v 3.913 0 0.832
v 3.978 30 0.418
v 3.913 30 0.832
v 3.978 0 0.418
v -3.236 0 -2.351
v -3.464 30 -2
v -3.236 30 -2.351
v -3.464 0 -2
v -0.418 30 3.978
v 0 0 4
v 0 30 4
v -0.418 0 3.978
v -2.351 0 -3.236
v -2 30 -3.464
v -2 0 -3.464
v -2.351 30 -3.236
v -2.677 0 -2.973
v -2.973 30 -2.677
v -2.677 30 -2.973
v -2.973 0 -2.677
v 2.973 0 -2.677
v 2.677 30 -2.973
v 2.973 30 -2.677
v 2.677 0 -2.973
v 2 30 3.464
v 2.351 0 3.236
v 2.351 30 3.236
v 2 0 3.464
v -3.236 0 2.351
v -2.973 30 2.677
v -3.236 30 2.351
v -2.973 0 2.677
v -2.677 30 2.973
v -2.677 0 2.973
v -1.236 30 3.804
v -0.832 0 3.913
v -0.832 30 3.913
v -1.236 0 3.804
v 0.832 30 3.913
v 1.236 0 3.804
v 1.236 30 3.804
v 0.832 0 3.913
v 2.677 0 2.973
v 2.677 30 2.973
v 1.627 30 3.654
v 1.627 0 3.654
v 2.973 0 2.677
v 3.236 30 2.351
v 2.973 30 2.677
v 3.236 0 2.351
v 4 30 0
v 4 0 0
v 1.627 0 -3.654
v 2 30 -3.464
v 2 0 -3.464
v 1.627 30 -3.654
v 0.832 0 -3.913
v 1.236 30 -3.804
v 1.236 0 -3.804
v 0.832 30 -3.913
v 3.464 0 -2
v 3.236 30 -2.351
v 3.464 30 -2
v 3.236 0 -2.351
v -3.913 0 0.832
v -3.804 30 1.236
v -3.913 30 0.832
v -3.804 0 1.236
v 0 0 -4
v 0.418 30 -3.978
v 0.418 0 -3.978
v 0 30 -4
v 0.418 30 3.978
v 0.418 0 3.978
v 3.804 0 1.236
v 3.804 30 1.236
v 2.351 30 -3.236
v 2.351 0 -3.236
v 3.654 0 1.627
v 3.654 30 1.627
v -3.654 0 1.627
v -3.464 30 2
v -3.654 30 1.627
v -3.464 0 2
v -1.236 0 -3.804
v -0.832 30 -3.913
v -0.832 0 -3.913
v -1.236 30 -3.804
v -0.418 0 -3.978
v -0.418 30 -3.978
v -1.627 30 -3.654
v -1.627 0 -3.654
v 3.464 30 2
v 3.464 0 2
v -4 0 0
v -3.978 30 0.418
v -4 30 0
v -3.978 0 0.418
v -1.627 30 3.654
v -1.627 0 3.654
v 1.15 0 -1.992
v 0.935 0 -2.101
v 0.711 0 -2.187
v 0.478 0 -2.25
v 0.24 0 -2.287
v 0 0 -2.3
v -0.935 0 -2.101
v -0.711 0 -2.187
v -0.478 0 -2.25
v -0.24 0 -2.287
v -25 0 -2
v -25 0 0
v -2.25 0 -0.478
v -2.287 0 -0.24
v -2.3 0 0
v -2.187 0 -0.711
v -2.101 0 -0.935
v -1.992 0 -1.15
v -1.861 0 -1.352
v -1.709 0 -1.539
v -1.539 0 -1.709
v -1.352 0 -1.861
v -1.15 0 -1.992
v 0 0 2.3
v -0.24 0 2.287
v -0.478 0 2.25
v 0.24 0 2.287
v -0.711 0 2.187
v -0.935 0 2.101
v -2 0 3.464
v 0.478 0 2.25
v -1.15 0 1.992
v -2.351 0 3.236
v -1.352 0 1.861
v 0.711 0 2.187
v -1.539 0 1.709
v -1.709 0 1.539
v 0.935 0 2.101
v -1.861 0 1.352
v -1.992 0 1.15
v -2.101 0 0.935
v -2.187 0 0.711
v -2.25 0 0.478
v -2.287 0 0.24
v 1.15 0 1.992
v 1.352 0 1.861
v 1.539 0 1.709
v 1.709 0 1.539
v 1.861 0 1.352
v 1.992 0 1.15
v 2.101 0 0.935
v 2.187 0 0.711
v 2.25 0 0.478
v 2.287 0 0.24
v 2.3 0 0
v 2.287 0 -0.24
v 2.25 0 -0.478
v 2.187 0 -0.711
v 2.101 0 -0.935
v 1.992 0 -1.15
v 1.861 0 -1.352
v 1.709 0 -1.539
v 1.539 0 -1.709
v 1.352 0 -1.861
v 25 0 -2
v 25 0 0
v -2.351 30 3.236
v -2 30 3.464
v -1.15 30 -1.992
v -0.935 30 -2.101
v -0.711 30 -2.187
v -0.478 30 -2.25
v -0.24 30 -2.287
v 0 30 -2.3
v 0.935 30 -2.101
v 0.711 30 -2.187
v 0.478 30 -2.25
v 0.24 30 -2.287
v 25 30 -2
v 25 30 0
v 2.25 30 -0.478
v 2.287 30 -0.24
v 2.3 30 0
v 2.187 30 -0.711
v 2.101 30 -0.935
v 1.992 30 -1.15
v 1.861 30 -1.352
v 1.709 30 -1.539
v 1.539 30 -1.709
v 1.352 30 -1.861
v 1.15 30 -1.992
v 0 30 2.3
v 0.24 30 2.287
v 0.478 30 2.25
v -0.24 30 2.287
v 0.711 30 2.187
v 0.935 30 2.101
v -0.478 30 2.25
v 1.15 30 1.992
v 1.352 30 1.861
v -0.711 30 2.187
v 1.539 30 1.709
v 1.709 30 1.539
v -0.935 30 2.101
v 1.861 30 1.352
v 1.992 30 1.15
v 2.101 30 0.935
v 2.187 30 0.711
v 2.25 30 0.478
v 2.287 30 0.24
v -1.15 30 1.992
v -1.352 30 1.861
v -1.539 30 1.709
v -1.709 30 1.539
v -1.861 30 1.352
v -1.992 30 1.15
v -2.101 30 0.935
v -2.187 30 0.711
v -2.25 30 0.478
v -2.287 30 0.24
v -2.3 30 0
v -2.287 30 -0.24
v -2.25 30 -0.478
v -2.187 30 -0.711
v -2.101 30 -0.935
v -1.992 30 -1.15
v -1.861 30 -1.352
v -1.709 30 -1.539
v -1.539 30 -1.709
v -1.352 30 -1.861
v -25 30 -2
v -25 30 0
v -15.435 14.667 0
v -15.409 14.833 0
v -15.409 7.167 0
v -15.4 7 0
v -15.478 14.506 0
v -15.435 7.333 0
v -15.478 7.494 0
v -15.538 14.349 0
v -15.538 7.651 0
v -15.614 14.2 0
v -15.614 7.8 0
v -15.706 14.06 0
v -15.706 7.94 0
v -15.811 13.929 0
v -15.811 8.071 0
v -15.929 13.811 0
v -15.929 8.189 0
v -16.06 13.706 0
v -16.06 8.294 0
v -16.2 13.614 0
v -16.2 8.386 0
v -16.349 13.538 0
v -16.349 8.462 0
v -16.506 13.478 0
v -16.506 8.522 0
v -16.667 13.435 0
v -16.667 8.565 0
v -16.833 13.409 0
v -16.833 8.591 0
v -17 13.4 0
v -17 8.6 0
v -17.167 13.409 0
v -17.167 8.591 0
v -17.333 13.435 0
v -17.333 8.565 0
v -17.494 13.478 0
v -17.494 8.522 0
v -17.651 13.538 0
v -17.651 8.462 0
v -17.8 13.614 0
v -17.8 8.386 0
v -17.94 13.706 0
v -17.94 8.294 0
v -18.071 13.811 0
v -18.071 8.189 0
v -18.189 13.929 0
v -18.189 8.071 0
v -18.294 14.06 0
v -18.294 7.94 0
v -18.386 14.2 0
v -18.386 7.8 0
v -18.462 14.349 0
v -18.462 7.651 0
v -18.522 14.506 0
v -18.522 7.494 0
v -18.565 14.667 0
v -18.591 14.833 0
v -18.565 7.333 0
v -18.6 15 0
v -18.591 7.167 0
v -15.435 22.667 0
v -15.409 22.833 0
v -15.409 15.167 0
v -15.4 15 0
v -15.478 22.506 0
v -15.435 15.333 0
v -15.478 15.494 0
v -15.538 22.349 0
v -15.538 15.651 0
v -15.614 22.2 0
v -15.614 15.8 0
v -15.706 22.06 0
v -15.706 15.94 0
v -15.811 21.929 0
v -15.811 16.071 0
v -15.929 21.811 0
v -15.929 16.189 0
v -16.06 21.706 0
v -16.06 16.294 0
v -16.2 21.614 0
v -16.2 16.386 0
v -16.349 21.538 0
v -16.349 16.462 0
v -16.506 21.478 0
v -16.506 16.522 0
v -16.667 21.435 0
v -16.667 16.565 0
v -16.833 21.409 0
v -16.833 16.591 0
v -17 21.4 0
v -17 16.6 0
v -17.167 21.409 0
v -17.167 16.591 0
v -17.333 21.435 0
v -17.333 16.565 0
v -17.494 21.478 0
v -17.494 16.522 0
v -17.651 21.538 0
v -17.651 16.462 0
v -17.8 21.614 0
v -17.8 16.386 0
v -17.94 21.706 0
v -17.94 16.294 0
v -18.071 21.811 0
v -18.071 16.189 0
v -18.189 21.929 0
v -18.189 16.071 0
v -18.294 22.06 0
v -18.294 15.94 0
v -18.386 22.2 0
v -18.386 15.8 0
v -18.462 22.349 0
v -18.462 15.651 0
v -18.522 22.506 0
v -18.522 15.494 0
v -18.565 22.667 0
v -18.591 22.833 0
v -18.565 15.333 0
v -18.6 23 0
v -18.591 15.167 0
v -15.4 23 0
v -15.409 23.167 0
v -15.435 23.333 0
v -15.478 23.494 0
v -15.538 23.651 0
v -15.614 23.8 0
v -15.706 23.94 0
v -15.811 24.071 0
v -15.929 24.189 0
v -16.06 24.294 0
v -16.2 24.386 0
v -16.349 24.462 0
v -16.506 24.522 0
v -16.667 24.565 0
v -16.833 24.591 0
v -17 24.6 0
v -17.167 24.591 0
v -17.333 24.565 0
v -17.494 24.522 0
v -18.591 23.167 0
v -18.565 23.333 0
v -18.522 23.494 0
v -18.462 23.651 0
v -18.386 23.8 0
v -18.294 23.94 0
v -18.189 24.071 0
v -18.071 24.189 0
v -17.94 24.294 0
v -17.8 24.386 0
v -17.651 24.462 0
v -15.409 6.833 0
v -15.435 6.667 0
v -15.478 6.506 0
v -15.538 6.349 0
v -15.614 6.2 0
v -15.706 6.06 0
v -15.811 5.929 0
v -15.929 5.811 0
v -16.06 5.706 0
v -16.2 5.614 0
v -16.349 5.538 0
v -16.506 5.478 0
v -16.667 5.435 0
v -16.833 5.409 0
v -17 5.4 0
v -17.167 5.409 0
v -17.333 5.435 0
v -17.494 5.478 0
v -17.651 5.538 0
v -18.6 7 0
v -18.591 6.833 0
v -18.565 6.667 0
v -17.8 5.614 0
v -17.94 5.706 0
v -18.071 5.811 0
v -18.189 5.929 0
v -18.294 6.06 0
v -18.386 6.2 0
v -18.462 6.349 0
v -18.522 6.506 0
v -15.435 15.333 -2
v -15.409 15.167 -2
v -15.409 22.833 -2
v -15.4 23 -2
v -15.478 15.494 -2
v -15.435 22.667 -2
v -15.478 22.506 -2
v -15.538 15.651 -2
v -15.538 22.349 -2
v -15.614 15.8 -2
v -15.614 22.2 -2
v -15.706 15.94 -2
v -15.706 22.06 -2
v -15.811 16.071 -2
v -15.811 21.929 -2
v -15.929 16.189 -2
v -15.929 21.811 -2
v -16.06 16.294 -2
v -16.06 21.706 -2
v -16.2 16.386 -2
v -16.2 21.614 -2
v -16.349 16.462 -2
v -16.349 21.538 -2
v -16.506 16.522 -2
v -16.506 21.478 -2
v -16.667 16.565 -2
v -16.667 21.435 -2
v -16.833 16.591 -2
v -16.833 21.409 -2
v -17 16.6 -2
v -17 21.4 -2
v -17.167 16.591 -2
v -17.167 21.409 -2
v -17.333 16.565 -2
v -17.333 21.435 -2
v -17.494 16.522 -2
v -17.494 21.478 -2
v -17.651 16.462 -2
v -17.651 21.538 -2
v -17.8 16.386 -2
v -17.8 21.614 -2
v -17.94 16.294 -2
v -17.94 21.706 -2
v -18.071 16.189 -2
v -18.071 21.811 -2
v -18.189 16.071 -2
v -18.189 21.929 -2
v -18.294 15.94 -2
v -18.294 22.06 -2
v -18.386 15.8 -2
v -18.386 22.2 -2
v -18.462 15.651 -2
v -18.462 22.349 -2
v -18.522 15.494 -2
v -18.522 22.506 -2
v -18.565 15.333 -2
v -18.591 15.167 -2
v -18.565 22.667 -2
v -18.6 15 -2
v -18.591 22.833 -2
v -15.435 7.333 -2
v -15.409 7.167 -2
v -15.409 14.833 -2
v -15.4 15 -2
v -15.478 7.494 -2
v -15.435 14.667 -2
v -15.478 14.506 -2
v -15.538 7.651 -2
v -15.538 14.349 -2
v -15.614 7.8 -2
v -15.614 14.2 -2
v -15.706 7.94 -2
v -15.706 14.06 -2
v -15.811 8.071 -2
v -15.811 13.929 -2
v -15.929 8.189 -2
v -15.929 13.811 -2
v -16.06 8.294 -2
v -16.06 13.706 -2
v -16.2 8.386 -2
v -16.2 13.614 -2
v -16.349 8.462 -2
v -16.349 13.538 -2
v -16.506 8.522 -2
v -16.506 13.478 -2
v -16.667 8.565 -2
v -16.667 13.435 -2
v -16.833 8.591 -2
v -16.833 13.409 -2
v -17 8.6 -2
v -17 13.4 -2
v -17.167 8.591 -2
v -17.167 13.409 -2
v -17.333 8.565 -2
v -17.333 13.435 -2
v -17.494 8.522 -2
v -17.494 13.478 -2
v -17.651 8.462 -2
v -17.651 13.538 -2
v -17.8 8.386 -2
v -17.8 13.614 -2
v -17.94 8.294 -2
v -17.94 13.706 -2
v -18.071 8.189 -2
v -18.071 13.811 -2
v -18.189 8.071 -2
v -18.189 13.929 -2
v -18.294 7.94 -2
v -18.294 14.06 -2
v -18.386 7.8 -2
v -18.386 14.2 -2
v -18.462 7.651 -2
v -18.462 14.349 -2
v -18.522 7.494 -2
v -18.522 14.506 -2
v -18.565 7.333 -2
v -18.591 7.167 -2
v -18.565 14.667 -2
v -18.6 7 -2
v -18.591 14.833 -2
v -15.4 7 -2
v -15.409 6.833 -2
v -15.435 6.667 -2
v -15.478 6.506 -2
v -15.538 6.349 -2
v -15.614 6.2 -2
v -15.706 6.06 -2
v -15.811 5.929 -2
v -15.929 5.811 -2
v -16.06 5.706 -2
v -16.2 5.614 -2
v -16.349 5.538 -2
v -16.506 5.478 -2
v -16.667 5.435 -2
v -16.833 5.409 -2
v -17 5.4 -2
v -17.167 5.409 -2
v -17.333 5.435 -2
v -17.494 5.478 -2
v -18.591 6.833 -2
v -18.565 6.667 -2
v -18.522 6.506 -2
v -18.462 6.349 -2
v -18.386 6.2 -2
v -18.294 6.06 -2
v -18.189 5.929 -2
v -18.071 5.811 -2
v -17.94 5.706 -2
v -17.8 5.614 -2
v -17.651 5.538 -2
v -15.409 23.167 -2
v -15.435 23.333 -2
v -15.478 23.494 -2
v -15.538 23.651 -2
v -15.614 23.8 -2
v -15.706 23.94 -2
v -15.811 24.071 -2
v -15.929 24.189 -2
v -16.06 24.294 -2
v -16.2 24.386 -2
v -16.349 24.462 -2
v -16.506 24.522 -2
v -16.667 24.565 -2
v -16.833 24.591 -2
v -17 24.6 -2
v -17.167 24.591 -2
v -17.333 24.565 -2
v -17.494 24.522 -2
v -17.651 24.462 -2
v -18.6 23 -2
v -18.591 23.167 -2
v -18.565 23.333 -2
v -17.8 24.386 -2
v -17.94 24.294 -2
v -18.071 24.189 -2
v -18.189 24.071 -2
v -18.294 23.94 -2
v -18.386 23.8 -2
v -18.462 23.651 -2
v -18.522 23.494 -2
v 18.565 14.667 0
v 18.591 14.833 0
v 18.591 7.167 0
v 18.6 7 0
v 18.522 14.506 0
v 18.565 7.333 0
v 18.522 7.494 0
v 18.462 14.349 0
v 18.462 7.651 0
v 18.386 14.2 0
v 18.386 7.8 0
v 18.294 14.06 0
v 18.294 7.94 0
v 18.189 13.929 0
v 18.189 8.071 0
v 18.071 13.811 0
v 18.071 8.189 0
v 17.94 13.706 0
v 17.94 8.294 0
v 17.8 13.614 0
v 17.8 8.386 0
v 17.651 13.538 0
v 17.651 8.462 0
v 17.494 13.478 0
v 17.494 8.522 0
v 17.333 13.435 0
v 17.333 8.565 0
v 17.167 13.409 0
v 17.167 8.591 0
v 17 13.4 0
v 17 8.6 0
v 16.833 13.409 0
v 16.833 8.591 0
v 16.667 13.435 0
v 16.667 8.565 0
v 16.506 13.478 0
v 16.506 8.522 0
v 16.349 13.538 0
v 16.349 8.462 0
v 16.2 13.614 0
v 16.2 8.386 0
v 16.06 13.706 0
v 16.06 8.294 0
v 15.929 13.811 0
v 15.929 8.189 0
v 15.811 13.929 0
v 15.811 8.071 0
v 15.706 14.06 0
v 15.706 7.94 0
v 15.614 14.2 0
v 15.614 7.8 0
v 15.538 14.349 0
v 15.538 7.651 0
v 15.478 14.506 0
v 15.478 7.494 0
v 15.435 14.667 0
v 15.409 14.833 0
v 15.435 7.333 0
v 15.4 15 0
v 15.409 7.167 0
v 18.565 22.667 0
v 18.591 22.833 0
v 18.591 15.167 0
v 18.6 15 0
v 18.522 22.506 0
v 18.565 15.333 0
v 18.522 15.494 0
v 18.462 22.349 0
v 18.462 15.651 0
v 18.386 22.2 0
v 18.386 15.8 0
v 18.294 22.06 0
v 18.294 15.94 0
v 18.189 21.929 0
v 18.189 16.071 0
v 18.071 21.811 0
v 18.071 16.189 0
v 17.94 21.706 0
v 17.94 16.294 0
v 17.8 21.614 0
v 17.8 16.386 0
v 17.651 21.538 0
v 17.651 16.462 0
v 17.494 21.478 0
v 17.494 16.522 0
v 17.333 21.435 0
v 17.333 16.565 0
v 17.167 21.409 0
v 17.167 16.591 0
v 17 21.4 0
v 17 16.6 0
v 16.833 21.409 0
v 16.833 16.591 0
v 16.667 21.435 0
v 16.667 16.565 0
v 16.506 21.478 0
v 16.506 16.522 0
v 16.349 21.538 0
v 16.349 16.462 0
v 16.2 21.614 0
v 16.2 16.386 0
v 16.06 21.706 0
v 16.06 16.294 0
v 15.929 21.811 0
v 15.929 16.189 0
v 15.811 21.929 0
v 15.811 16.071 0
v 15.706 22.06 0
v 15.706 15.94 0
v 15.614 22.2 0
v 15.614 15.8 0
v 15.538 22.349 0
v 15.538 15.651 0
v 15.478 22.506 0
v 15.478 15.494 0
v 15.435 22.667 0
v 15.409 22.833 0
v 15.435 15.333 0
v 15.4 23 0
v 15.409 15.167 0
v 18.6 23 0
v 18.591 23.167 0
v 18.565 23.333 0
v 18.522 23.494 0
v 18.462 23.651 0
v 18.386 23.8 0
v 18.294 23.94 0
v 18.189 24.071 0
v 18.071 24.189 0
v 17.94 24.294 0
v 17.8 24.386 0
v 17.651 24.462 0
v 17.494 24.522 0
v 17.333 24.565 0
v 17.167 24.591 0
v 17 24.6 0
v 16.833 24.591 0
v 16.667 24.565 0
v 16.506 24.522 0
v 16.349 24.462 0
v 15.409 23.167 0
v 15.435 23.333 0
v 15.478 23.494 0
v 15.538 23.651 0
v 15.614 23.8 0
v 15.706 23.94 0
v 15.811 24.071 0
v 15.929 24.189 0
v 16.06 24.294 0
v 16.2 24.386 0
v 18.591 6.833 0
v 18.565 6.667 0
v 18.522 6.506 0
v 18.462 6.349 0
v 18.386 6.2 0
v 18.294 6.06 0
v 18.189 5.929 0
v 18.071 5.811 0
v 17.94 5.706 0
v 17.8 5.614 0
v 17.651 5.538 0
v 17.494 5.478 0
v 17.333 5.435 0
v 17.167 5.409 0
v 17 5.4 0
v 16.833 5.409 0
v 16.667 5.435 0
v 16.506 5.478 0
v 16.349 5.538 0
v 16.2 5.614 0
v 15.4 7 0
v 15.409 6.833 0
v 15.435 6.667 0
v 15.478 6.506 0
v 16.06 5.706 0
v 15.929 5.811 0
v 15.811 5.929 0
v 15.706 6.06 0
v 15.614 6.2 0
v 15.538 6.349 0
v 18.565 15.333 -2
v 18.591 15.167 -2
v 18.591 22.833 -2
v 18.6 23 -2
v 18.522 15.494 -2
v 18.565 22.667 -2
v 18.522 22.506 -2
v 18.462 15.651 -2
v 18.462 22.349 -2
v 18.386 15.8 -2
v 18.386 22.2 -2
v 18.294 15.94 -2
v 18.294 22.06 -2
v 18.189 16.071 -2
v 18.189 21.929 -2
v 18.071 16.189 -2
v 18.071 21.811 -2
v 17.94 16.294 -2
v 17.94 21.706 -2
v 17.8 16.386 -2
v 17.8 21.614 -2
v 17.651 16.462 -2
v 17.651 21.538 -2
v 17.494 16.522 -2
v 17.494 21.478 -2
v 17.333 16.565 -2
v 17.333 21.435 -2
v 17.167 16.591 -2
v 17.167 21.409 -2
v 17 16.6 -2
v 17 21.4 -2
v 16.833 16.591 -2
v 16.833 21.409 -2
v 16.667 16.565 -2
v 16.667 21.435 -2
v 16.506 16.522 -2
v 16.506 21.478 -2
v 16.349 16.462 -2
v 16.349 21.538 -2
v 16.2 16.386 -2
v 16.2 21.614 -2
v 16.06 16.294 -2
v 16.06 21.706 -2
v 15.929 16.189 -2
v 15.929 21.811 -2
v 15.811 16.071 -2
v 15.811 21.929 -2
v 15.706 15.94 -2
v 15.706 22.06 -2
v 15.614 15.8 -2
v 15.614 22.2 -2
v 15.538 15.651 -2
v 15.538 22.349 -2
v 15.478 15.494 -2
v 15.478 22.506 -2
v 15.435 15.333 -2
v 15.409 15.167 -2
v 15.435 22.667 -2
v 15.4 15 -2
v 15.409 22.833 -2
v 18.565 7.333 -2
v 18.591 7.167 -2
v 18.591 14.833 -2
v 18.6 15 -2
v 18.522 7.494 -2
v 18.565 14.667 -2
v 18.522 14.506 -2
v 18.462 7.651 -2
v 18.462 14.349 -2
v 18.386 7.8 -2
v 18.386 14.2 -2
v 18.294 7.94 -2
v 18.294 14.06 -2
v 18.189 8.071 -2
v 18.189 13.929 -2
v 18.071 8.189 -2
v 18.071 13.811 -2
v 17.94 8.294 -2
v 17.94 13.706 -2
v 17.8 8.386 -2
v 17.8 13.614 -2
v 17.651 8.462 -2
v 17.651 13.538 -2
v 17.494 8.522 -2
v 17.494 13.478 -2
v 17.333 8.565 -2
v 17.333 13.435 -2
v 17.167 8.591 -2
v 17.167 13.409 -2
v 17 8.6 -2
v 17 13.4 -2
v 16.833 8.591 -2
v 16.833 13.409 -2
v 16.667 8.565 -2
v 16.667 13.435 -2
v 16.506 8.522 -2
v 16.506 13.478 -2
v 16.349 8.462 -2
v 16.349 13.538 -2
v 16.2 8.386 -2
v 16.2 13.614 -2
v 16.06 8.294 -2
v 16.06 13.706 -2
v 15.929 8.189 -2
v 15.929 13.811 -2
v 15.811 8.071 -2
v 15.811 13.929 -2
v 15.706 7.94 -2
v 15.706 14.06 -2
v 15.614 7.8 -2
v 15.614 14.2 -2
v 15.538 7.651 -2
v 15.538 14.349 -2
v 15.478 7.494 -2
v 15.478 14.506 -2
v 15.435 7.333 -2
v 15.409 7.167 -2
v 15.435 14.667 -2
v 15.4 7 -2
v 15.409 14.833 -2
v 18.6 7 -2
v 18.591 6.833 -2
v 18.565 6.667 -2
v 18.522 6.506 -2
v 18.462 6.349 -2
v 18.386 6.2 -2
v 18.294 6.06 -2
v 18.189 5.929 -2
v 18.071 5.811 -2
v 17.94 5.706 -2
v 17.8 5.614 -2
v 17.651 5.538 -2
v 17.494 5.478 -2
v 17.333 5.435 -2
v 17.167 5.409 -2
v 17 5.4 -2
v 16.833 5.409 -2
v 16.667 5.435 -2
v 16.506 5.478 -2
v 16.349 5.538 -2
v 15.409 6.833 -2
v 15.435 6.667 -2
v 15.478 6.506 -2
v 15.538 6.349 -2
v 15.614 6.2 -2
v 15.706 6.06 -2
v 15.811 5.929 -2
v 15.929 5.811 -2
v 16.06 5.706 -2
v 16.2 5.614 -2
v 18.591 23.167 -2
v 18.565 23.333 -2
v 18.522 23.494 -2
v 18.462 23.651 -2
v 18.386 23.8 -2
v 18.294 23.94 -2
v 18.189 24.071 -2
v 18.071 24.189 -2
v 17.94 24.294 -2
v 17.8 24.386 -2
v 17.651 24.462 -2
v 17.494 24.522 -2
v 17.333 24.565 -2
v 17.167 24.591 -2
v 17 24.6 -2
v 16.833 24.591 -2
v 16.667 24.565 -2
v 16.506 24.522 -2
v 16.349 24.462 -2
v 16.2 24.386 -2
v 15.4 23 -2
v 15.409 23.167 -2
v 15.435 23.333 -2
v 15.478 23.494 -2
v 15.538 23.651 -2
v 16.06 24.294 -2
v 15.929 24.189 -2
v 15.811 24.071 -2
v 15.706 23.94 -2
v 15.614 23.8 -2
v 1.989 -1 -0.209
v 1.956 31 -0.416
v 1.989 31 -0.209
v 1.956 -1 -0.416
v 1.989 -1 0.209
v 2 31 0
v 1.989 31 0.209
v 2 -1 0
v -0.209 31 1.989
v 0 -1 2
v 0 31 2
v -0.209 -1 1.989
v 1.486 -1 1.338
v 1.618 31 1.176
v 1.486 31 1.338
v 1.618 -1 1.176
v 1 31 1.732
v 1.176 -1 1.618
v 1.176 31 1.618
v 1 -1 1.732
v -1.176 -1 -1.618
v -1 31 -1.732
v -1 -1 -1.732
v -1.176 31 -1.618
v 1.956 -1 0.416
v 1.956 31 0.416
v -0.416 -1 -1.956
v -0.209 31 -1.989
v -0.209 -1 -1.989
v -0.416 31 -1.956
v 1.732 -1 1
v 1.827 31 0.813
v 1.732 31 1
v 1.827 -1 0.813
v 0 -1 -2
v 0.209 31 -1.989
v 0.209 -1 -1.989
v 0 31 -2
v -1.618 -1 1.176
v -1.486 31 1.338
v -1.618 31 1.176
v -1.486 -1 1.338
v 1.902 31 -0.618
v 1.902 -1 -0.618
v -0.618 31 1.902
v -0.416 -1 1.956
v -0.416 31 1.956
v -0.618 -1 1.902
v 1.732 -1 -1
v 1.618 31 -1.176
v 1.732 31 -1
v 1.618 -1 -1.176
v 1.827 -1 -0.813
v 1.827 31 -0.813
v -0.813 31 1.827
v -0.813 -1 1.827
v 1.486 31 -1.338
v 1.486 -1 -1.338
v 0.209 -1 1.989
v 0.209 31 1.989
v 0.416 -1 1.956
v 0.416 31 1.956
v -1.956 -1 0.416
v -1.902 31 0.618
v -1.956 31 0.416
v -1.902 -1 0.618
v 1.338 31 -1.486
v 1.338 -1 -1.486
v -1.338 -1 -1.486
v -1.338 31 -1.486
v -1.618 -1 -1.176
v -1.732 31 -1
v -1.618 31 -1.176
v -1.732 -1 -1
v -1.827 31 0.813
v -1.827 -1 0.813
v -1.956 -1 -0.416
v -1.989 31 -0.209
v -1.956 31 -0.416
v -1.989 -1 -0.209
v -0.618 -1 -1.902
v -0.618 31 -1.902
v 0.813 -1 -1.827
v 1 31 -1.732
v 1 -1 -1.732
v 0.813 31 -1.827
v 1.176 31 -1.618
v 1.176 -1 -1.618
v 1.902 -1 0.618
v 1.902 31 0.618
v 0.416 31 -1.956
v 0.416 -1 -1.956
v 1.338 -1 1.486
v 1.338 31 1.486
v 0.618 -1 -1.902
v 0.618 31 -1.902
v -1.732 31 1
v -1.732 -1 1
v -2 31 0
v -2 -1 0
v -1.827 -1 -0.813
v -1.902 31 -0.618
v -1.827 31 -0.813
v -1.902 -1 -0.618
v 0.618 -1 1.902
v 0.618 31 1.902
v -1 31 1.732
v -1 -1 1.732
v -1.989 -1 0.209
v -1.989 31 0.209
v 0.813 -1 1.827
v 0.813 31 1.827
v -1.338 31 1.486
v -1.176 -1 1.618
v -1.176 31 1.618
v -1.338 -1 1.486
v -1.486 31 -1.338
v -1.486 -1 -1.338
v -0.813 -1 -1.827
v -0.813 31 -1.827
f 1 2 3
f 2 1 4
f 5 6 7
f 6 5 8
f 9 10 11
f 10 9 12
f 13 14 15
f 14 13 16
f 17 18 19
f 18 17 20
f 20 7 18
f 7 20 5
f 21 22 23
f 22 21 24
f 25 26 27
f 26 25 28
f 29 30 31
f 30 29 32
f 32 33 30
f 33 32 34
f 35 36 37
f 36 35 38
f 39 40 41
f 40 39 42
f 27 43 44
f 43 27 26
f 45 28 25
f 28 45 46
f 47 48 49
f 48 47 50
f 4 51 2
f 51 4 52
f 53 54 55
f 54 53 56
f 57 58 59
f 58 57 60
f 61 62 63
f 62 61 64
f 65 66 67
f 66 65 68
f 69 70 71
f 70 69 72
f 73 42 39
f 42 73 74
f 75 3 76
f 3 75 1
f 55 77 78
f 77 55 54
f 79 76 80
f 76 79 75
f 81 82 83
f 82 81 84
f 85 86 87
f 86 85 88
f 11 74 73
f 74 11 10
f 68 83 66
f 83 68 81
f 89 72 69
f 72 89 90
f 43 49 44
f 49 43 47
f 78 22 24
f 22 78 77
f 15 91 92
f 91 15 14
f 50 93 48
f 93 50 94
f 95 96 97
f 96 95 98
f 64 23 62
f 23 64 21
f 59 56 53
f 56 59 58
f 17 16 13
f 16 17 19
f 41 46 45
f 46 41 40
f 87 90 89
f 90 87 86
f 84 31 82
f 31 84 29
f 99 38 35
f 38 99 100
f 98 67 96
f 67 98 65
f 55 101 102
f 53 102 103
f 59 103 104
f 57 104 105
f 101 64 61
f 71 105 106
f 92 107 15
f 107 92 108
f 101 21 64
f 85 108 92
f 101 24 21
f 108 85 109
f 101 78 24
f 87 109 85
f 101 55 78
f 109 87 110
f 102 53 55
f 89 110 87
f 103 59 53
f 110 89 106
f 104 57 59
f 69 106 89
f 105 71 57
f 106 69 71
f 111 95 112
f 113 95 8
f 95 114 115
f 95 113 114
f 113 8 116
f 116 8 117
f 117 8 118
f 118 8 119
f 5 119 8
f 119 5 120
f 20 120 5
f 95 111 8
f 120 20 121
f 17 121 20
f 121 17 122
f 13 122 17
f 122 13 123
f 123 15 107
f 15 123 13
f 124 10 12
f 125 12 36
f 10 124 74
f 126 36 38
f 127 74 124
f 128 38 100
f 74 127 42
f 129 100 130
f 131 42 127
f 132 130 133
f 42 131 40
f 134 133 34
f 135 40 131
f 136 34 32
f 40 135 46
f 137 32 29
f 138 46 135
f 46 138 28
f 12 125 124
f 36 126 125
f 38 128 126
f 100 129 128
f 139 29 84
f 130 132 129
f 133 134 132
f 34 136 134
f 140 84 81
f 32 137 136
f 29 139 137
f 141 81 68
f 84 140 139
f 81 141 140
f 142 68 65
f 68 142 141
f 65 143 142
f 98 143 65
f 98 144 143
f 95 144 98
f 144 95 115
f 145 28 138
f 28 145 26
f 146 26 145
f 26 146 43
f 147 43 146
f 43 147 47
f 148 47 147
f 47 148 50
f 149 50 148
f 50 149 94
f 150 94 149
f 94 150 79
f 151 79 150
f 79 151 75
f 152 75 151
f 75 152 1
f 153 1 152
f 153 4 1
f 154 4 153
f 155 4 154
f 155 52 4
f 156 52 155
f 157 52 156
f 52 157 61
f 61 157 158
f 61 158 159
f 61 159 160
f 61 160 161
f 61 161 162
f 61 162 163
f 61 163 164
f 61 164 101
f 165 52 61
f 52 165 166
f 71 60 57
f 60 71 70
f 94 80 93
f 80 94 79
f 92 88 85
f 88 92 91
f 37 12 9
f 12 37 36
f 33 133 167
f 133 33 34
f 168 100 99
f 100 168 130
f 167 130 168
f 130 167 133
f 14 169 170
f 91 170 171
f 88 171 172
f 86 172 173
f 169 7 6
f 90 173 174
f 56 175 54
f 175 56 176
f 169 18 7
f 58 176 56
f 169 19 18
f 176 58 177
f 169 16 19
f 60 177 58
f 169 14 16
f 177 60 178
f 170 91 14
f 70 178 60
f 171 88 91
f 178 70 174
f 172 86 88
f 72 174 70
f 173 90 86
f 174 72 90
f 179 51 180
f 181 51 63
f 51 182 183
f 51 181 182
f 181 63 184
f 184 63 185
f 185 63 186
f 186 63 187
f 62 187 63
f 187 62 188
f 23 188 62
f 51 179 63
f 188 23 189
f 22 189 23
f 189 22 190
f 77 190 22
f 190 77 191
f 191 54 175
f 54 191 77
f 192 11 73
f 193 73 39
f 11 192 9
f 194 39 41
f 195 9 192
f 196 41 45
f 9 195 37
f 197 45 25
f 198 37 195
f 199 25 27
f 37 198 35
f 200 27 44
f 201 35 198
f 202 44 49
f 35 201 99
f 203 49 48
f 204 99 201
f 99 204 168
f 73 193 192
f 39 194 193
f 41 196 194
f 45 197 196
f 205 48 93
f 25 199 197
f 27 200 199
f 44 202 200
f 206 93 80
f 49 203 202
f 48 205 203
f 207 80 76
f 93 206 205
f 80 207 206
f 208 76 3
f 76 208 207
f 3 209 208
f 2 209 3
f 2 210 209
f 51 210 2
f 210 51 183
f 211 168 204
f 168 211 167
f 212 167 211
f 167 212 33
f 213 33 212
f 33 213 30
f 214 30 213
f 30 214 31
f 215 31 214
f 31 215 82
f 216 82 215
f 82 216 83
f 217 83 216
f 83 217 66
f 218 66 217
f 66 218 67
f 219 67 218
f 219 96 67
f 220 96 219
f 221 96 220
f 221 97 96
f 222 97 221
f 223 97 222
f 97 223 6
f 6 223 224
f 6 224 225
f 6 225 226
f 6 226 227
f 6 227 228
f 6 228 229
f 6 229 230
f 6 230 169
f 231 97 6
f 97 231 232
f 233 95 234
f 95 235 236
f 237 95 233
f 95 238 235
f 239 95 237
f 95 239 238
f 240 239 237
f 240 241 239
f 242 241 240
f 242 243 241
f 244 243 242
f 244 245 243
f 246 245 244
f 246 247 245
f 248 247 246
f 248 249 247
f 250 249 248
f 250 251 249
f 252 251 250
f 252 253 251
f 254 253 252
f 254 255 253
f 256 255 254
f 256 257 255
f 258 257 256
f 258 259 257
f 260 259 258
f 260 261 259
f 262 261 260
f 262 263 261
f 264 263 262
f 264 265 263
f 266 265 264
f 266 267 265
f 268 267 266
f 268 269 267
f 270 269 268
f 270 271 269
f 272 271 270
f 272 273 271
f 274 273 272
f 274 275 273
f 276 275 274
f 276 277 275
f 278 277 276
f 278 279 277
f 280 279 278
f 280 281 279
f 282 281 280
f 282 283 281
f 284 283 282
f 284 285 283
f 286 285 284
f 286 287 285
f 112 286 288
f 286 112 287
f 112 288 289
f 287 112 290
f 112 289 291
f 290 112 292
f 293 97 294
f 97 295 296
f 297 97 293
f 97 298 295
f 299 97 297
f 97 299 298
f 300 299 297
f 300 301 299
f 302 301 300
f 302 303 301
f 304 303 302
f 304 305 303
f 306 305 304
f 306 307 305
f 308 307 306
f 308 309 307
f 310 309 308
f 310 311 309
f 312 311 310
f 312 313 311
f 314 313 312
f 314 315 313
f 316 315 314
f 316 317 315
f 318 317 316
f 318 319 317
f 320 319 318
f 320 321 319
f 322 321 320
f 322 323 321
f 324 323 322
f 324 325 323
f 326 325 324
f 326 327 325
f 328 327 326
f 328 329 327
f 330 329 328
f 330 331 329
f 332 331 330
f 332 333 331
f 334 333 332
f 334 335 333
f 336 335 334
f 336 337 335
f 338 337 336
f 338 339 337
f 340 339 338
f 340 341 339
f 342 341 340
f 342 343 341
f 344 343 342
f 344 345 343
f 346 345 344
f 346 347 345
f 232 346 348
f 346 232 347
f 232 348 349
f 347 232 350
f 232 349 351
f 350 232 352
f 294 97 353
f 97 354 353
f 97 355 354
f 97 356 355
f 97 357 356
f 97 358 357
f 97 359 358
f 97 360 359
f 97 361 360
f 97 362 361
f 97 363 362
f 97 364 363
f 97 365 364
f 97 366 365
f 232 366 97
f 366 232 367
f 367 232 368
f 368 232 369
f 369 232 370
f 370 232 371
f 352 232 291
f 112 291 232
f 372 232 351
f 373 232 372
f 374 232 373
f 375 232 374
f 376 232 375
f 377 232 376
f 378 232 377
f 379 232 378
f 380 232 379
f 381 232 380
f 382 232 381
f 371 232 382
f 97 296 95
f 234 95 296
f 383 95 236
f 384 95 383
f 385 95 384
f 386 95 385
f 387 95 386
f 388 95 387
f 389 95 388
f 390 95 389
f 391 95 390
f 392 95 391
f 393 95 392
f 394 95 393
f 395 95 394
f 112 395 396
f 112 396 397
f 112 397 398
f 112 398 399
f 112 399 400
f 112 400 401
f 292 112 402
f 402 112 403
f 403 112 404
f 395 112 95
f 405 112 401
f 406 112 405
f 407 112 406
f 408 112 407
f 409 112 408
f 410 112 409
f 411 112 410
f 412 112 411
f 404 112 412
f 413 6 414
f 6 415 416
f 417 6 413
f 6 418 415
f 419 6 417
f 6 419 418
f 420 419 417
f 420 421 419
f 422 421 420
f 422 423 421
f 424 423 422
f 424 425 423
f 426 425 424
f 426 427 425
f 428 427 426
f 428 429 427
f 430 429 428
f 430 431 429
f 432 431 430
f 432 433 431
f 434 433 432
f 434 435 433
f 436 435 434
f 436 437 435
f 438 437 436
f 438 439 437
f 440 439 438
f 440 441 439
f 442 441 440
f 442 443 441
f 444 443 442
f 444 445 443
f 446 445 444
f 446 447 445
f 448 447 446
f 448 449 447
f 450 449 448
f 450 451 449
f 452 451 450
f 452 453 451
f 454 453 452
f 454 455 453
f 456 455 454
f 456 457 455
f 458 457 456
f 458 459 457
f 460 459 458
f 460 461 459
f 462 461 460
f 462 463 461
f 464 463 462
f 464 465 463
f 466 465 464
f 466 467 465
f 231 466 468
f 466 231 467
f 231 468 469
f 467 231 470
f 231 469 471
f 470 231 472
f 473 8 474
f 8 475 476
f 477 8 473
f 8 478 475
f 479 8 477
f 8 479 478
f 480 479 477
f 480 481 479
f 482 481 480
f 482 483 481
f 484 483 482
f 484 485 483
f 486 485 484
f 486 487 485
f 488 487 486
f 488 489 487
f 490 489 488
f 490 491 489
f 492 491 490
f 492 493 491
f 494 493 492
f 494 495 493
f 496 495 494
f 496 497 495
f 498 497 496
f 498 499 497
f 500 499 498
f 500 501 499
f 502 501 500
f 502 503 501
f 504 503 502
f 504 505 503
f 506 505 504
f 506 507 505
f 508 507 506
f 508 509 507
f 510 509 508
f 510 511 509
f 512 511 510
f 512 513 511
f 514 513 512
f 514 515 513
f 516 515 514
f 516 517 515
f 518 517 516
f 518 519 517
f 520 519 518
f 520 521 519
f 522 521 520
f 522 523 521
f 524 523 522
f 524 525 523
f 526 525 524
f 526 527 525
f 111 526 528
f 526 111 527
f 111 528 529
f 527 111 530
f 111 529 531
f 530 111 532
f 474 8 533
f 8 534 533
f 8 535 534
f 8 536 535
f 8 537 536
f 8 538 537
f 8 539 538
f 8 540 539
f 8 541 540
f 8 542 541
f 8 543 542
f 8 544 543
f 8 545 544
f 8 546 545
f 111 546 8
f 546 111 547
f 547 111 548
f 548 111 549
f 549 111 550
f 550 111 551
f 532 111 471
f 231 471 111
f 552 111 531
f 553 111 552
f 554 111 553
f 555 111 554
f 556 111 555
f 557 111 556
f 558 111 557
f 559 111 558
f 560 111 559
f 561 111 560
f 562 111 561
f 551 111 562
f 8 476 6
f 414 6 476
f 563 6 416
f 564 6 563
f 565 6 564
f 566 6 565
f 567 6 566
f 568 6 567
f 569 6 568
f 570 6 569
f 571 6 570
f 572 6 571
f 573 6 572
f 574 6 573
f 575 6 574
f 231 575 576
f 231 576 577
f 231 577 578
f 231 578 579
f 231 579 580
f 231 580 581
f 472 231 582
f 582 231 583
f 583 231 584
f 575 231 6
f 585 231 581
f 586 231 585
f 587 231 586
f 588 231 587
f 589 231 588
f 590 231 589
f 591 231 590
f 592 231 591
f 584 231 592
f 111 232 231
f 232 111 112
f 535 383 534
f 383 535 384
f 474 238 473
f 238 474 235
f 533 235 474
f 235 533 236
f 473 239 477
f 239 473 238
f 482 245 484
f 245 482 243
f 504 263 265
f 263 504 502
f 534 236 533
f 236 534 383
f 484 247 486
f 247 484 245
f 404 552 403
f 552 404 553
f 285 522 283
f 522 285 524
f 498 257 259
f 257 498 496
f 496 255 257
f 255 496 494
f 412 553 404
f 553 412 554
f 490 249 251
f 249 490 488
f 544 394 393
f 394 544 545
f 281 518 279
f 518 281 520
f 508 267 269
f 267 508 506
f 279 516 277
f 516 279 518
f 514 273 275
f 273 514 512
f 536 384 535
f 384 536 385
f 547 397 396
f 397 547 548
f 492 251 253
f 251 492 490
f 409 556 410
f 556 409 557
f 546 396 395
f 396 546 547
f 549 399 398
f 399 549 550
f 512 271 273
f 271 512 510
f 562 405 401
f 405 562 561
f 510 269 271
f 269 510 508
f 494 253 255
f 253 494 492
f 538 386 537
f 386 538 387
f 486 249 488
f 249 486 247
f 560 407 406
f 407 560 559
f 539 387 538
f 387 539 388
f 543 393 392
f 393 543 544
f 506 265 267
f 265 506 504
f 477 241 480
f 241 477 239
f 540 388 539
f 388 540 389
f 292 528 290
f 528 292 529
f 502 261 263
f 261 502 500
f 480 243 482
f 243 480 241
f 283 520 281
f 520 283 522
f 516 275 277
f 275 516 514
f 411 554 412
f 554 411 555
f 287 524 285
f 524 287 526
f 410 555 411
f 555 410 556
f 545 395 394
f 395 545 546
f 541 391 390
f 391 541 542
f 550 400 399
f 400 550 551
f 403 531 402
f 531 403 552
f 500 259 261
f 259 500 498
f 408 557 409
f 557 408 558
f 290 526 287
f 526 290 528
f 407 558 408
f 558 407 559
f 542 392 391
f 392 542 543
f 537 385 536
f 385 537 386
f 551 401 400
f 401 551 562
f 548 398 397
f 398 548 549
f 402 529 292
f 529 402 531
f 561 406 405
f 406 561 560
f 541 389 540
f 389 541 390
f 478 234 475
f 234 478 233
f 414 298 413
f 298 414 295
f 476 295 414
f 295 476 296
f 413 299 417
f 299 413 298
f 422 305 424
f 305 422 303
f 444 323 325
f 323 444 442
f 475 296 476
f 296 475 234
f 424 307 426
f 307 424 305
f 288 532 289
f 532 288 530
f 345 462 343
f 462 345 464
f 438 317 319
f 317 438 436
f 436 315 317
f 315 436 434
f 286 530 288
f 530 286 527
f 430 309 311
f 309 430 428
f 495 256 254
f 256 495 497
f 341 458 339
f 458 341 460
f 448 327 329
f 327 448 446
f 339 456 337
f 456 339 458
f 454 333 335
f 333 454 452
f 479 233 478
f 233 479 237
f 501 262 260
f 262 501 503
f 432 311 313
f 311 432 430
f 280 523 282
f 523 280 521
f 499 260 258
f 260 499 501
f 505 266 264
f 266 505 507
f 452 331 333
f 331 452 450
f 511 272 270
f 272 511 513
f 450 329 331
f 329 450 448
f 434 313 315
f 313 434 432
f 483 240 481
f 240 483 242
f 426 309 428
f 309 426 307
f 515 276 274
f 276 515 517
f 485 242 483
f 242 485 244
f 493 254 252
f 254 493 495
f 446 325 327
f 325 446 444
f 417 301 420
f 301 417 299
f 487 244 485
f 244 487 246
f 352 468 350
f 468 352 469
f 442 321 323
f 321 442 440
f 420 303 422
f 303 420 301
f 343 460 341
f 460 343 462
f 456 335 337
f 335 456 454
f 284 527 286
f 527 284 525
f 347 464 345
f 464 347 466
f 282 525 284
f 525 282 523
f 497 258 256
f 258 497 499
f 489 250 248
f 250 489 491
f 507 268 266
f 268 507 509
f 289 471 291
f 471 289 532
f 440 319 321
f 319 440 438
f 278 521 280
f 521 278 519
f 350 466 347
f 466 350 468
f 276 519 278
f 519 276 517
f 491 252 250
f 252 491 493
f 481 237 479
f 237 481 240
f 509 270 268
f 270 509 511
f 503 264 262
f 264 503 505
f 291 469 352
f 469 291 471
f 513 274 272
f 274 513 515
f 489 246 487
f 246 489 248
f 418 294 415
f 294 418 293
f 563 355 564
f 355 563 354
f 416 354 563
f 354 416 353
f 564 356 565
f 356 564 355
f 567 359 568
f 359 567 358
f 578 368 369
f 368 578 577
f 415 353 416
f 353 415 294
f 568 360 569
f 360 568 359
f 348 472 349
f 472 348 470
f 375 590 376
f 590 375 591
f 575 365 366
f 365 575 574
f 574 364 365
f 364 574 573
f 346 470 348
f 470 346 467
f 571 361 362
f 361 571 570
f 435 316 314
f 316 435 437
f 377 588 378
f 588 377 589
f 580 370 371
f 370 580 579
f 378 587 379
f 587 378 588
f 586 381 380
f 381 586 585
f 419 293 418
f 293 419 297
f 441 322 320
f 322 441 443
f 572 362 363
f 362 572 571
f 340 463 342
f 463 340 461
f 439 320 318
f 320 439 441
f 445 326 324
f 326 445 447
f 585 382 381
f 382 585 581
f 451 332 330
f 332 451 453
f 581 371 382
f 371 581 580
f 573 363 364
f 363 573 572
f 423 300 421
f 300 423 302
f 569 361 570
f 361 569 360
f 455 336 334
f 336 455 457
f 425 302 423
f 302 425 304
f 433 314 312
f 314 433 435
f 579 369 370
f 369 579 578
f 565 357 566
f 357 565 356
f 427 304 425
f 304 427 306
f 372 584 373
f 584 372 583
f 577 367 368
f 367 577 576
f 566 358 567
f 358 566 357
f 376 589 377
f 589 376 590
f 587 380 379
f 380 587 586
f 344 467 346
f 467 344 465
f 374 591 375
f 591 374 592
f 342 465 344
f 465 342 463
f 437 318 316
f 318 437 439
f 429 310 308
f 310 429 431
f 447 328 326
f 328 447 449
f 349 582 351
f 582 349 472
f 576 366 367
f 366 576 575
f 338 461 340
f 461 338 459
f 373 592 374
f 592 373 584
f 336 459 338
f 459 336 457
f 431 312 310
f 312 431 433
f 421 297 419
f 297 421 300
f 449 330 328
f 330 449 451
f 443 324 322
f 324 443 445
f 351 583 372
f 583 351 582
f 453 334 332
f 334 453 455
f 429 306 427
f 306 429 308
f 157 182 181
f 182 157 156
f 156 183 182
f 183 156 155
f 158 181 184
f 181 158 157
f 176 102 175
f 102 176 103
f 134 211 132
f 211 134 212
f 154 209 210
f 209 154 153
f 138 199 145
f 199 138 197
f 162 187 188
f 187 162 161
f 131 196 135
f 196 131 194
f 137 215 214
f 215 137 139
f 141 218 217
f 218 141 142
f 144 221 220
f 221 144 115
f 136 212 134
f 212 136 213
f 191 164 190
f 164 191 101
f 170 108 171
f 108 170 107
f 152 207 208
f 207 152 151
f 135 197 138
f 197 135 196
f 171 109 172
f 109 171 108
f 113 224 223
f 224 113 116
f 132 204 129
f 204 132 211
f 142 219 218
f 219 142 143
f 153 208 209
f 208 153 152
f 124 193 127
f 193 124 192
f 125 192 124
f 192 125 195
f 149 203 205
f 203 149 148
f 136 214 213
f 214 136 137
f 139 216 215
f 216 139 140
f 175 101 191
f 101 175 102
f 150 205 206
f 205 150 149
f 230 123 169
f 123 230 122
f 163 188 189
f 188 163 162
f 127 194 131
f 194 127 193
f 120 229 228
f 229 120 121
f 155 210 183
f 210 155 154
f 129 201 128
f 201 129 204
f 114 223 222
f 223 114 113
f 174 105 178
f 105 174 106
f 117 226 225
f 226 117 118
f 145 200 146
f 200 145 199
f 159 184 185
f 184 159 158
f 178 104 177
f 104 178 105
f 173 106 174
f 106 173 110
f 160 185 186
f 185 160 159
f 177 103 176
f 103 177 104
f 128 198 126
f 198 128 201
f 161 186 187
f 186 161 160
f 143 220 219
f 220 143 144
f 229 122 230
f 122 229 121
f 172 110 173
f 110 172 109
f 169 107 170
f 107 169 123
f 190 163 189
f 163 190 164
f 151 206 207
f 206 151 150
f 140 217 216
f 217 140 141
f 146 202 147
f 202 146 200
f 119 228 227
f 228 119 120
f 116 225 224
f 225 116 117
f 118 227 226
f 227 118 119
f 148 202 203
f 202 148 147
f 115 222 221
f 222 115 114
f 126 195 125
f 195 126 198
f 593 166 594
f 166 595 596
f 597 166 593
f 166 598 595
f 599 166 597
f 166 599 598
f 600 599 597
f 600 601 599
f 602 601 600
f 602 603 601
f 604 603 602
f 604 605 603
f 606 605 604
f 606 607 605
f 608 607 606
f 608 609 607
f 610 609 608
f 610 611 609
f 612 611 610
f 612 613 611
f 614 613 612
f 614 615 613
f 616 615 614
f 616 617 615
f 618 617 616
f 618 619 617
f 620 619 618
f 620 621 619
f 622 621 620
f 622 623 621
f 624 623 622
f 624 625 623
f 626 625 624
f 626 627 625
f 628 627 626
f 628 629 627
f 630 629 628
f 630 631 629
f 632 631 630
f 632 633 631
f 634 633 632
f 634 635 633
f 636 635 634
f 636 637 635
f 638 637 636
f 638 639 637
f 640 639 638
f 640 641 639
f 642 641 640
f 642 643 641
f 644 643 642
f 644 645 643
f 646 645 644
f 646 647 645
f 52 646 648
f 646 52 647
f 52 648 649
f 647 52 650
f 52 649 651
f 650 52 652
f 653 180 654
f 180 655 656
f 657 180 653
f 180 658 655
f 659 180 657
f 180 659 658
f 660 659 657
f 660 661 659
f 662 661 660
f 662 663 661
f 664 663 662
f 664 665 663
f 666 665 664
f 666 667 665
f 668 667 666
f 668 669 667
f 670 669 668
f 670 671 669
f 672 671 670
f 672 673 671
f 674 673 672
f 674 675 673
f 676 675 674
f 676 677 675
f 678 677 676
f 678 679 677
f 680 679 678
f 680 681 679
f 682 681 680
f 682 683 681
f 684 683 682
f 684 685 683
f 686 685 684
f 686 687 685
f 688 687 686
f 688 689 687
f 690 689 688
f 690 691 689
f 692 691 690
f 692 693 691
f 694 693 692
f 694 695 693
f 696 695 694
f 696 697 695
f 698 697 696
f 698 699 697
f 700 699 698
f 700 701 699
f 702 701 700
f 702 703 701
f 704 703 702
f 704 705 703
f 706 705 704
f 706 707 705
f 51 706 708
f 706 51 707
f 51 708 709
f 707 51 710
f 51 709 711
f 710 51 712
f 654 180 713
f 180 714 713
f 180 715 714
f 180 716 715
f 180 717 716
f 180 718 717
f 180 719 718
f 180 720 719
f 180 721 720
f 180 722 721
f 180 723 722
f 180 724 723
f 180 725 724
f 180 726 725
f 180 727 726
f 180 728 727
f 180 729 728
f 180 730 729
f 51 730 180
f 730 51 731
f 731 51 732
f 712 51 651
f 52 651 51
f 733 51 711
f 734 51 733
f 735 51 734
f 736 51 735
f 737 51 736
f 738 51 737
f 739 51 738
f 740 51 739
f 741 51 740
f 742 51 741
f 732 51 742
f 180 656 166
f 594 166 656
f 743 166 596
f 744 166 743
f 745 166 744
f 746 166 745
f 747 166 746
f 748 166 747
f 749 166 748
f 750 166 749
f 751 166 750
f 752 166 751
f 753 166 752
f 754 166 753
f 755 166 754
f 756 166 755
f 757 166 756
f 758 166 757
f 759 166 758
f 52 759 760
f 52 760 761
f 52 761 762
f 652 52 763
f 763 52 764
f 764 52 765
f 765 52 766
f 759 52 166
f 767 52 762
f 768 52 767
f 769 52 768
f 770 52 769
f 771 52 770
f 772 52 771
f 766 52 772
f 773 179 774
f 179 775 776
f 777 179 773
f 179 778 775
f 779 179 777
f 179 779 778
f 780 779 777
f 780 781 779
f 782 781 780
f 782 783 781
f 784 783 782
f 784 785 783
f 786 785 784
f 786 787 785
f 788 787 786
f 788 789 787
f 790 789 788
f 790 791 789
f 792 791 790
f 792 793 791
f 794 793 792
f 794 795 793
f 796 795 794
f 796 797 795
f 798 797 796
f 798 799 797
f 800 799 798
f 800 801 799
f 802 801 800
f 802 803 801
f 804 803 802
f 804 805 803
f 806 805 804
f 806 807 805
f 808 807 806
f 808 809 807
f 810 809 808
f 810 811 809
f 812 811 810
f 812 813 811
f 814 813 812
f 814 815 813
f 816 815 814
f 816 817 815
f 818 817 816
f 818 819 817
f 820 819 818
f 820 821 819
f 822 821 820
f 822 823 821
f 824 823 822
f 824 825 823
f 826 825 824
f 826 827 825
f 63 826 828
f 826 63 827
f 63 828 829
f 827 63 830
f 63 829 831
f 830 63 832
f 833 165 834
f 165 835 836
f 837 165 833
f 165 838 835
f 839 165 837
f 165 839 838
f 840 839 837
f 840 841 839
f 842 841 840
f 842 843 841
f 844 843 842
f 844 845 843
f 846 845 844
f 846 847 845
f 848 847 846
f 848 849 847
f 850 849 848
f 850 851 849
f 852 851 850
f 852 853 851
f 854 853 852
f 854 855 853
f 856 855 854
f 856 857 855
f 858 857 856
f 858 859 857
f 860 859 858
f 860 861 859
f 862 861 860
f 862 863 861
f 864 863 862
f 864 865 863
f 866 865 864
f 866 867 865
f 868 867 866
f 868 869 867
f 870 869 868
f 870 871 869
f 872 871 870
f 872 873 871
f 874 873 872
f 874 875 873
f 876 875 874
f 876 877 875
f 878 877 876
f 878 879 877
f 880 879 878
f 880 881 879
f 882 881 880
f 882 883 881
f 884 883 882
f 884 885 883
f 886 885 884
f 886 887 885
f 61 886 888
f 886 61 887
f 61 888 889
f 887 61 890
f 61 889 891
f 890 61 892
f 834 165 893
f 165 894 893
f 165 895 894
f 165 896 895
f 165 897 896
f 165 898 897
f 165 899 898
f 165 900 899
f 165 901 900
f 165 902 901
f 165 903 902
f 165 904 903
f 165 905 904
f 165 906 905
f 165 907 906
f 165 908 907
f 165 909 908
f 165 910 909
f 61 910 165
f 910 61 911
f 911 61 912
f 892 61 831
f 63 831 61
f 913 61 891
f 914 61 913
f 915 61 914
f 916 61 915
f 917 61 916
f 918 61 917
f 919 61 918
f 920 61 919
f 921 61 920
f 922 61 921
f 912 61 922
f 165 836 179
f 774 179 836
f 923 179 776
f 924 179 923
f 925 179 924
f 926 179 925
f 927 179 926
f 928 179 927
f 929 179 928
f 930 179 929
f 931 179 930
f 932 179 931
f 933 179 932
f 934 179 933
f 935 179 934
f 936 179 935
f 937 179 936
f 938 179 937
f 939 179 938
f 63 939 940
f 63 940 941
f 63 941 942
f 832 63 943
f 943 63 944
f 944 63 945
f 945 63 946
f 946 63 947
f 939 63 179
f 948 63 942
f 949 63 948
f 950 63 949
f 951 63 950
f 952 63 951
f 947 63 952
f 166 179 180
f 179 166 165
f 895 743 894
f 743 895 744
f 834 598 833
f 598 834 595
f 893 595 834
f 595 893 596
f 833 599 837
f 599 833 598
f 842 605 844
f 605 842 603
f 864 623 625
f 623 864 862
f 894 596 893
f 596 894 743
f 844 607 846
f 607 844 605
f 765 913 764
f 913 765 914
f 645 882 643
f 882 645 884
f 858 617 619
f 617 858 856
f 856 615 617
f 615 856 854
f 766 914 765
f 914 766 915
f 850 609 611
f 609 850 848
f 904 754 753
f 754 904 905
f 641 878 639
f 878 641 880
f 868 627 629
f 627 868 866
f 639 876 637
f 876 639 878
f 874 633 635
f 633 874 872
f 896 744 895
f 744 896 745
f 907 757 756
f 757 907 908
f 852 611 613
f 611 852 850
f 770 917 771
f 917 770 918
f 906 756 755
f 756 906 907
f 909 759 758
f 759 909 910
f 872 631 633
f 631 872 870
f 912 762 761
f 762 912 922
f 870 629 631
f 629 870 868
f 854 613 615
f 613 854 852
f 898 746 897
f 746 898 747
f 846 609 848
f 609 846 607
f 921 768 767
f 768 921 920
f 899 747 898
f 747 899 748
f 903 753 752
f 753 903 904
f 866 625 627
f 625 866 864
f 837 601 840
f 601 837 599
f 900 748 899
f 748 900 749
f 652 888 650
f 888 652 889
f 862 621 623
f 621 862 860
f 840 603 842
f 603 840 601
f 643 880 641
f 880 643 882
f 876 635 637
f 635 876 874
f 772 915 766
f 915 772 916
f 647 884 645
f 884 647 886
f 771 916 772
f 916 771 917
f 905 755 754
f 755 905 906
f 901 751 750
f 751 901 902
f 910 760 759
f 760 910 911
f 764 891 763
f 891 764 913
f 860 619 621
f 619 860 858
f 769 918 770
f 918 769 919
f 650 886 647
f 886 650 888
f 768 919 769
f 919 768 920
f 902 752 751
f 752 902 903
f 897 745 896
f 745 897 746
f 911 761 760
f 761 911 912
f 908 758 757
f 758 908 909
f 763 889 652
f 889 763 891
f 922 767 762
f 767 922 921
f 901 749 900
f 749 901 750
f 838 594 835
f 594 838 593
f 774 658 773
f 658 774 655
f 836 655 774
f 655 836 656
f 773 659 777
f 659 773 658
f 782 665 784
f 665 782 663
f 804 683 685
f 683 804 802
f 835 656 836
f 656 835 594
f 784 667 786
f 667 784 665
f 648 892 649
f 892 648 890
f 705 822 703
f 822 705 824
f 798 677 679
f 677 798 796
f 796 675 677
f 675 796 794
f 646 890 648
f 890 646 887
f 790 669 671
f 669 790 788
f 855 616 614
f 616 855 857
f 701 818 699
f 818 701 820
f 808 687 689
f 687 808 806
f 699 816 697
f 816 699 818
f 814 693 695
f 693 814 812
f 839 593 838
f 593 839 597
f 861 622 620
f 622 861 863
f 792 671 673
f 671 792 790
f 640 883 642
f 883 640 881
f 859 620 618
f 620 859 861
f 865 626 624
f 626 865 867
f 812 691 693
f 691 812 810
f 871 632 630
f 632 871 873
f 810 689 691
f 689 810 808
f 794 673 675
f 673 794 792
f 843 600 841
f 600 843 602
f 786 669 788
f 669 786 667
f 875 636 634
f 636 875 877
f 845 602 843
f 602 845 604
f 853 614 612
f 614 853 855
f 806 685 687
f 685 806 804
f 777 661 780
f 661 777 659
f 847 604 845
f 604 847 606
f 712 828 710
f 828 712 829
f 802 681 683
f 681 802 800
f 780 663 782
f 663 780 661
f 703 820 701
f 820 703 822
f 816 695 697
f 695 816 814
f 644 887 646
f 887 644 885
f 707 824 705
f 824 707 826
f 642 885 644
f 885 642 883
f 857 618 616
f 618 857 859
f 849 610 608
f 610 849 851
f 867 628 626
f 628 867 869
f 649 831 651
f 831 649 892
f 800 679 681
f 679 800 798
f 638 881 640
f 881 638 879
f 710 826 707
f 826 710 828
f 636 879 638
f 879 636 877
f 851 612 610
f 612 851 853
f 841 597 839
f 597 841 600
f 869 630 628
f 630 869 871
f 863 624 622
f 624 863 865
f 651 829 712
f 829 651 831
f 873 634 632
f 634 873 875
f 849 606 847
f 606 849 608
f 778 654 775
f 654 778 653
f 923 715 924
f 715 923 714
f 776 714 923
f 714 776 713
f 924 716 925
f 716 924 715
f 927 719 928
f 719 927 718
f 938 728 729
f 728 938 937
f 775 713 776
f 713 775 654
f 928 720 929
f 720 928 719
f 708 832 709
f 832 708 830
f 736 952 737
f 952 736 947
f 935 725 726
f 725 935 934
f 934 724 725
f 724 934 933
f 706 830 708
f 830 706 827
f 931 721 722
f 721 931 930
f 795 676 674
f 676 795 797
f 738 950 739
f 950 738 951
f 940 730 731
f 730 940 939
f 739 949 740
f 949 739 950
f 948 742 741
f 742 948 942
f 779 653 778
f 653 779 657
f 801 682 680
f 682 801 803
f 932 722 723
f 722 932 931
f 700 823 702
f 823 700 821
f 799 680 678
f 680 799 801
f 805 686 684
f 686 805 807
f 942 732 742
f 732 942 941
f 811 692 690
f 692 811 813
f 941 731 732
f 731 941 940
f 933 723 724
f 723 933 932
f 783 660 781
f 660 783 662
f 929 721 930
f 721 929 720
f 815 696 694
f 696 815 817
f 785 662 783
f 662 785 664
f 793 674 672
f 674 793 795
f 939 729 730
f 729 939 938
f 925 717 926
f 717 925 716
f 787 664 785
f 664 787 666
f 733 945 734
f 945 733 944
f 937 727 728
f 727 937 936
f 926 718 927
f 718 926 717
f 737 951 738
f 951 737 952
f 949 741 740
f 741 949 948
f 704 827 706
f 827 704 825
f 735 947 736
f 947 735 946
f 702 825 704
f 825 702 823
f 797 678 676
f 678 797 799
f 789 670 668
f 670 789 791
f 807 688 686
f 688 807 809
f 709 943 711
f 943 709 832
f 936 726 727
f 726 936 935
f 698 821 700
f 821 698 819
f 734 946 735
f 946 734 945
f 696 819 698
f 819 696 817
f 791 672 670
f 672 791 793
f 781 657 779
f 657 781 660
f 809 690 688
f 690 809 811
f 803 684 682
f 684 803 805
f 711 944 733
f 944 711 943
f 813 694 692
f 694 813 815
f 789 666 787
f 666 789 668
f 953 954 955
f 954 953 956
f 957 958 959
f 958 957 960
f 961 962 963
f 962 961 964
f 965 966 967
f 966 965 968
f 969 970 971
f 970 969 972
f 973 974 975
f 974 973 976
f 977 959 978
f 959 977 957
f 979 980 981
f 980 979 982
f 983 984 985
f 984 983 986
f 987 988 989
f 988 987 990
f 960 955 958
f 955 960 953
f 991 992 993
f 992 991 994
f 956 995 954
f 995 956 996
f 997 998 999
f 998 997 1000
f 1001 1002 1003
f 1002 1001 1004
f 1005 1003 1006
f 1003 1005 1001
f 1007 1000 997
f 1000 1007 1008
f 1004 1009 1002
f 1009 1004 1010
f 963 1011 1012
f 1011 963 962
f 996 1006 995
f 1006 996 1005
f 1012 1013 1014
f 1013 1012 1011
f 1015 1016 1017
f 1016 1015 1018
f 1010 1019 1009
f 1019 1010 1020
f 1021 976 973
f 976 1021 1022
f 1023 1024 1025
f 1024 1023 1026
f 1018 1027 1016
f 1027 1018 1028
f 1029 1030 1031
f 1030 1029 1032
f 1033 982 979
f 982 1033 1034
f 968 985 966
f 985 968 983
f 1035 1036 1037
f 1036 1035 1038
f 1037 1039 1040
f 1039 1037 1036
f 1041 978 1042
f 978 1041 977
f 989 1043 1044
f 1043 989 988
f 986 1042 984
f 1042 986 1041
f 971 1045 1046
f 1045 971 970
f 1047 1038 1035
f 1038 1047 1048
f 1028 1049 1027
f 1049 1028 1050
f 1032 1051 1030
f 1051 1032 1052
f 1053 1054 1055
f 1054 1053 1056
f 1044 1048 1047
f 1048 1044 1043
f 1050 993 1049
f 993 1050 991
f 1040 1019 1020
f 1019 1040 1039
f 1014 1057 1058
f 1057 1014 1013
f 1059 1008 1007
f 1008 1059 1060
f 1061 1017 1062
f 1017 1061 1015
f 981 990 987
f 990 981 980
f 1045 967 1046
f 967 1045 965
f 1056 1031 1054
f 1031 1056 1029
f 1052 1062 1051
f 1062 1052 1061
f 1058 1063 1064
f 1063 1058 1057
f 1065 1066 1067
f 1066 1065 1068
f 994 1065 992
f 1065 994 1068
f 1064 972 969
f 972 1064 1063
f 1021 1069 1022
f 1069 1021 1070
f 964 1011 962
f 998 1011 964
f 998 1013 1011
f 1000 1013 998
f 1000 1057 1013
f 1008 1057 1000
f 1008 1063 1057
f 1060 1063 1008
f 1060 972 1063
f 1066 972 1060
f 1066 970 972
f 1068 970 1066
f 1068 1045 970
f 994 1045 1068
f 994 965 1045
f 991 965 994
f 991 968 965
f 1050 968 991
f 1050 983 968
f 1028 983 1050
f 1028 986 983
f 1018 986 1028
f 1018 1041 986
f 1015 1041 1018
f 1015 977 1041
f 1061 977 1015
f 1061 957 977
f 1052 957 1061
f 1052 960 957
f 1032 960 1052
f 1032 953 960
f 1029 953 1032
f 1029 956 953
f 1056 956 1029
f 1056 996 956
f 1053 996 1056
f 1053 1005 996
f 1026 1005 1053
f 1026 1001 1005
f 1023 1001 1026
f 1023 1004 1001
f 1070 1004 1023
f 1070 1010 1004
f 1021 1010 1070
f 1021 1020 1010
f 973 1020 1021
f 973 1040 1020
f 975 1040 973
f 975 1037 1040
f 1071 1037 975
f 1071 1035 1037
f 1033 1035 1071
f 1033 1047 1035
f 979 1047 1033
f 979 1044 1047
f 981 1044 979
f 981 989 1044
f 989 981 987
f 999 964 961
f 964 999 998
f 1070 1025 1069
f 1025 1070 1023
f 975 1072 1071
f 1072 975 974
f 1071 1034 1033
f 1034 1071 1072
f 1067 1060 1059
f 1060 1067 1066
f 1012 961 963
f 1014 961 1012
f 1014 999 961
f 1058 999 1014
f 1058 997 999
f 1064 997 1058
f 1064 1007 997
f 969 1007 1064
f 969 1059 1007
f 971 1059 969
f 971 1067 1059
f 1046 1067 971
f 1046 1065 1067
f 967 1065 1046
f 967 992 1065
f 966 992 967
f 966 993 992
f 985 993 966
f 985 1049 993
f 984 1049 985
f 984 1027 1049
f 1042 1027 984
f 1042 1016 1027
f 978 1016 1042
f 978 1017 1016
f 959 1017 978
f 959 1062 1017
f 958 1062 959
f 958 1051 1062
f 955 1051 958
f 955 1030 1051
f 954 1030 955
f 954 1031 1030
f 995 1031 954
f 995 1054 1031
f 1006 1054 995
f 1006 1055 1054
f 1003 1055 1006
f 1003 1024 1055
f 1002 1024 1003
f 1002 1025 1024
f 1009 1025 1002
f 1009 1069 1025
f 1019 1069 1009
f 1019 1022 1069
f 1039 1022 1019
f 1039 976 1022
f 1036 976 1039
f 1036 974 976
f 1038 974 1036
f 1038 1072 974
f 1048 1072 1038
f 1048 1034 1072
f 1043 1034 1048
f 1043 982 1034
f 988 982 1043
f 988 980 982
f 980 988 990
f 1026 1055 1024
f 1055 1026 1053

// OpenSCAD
$fn = 60;

// 基本寸法
leaf_length = 30;     // 縦 (Y軸方向)
leaf_width = 25;      // 横 (開き方向)
leaf_thickness = 2;   // 板厚
knuckle_od = 8;       // ナックル外径
pin_dia = 4;          // ピン軸径
pin_clearance = 0.6;  // 穴径クリアランス (ピン直径4mm + 0.6mm = 4.6mm)
knuckle_id = pin_dia + pin_clearance; 
pin_length = 32;      // ピン全長
knuckle_seg = leaf_length / 5; // ナックル1個の長さ (6mm)

// 皿穴モジュール (表面 z=0 から下向き -Z 方向に穴あけ)
module countersunk_hole() {
    // 皿モミ部 (上面径6mm、深さ1mmのテーパー)
    translate([0, 0, 0.01])
        cylinder(d1 = 6, d2 = 3.2, h = 1.01);
    // 貫通穴部 (下部貫通)
    translate([0, 0, -leaf_thickness - 0.5])
        cylinder(d = 3.2, h = leaf_thickness + 1);
}

// ネジ穴パターンの配置 (板の平坦部)
module screw_holes(x_offset) {
    pitch = 8;
    for (i = [-1, 0, 1]) {
        translate([x_offset, (leaf_length / 2) + (i * pitch), 0])
            countersunk_hole();
    }
}

// 左板 (Left Leaf: ナックルインデックス 0, 2, 4)
module left_leaf() {
    color([0.7, 0.7, 0.75])
    difference() {
        union() {
            // 平板部分 (X < 0 側)
            // Z方向は -leaf_thickness から 0 に配置してナックル上面と滑らかにつなぐ
            translate([-leaf_width, 0, -leaf_thickness])
                cube([leaf_width, leaf_length, leaf_thickness]);

            // ナックル部 (0, 2, 4 番目)
            for (idx = [0, 2, 4]) {
                translate([0, idx * knuckle_seg, 0])
                    rotate([-90, 0, 0])
                        cylinder(d = knuckle_od, h = knuckle_seg);
            }

            // 平板とナックル間の接続補強ブロック
            for (idx = [0, 2, 4]) {
                translate([-knuckle_od / 2, idx * knuckle_seg, -leaf_thickness])
                    cube([knuckle_od / 2, knuckle_seg, leaf_thickness]);
            }
        }
        // ピン穴 (貫通穴)
        translate([0, -1, 0])
            rotate([-90, 0, 0])
                cylinder(d = knuckle_id, h = leaf_length + 2);

        // M3 皿穴 (3個)
        screw_holes(-leaf_width + 8);
    }
}

// 右板 (Right Leaf: ナックルインデックス 1, 3)
module right_leaf() {
    color([0.75, 0.75, 0.8])
    difference() {
        union() {
            // 平板部分 (X > 0 側)
            translate([0, 0, -leaf_thickness])
                cube([leaf_width, leaf_length, leaf_thickness]);

            // ナックル部 (1, 3 番目)
            for (idx = [1, 3]) {
                translate([0, idx * knuckle_seg, 0])
                    rotate([-90, 0, 0])
                        cylinder(d = knuckle_od, h = knuckle_seg);
            }

            // 平板とナックル間の接続補強ブロック
            for (idx = [1, 3]) {
                translate([0, idx * knuckle_seg, -leaf_thickness])
                    cube([knuckle_od / 2, knuckle_seg, leaf_thickness]);
            }
        }
        // ピン穴 (貫通穴)
        translate([0, -1, 0])
            rotate([-90, 0, 0])
                cylinder(d = knuckle_id, h = leaf_length + 2);

        // M3 皿穴 (3個)
        screw_holes(leaf_width - 8);
    }
}

// ピン軸 (Pin)
module pin() {
    color([0.3, 0.3, 0.35])
    translate([0, -(pin_length - leaf_length) / 2, 0])
        rotate([-90, 0, 0])
            cylinder(d = pin_dia, h = pin_length);
}

// 全体アセンブリ
left_leaf();
right_leaf();
pin();
